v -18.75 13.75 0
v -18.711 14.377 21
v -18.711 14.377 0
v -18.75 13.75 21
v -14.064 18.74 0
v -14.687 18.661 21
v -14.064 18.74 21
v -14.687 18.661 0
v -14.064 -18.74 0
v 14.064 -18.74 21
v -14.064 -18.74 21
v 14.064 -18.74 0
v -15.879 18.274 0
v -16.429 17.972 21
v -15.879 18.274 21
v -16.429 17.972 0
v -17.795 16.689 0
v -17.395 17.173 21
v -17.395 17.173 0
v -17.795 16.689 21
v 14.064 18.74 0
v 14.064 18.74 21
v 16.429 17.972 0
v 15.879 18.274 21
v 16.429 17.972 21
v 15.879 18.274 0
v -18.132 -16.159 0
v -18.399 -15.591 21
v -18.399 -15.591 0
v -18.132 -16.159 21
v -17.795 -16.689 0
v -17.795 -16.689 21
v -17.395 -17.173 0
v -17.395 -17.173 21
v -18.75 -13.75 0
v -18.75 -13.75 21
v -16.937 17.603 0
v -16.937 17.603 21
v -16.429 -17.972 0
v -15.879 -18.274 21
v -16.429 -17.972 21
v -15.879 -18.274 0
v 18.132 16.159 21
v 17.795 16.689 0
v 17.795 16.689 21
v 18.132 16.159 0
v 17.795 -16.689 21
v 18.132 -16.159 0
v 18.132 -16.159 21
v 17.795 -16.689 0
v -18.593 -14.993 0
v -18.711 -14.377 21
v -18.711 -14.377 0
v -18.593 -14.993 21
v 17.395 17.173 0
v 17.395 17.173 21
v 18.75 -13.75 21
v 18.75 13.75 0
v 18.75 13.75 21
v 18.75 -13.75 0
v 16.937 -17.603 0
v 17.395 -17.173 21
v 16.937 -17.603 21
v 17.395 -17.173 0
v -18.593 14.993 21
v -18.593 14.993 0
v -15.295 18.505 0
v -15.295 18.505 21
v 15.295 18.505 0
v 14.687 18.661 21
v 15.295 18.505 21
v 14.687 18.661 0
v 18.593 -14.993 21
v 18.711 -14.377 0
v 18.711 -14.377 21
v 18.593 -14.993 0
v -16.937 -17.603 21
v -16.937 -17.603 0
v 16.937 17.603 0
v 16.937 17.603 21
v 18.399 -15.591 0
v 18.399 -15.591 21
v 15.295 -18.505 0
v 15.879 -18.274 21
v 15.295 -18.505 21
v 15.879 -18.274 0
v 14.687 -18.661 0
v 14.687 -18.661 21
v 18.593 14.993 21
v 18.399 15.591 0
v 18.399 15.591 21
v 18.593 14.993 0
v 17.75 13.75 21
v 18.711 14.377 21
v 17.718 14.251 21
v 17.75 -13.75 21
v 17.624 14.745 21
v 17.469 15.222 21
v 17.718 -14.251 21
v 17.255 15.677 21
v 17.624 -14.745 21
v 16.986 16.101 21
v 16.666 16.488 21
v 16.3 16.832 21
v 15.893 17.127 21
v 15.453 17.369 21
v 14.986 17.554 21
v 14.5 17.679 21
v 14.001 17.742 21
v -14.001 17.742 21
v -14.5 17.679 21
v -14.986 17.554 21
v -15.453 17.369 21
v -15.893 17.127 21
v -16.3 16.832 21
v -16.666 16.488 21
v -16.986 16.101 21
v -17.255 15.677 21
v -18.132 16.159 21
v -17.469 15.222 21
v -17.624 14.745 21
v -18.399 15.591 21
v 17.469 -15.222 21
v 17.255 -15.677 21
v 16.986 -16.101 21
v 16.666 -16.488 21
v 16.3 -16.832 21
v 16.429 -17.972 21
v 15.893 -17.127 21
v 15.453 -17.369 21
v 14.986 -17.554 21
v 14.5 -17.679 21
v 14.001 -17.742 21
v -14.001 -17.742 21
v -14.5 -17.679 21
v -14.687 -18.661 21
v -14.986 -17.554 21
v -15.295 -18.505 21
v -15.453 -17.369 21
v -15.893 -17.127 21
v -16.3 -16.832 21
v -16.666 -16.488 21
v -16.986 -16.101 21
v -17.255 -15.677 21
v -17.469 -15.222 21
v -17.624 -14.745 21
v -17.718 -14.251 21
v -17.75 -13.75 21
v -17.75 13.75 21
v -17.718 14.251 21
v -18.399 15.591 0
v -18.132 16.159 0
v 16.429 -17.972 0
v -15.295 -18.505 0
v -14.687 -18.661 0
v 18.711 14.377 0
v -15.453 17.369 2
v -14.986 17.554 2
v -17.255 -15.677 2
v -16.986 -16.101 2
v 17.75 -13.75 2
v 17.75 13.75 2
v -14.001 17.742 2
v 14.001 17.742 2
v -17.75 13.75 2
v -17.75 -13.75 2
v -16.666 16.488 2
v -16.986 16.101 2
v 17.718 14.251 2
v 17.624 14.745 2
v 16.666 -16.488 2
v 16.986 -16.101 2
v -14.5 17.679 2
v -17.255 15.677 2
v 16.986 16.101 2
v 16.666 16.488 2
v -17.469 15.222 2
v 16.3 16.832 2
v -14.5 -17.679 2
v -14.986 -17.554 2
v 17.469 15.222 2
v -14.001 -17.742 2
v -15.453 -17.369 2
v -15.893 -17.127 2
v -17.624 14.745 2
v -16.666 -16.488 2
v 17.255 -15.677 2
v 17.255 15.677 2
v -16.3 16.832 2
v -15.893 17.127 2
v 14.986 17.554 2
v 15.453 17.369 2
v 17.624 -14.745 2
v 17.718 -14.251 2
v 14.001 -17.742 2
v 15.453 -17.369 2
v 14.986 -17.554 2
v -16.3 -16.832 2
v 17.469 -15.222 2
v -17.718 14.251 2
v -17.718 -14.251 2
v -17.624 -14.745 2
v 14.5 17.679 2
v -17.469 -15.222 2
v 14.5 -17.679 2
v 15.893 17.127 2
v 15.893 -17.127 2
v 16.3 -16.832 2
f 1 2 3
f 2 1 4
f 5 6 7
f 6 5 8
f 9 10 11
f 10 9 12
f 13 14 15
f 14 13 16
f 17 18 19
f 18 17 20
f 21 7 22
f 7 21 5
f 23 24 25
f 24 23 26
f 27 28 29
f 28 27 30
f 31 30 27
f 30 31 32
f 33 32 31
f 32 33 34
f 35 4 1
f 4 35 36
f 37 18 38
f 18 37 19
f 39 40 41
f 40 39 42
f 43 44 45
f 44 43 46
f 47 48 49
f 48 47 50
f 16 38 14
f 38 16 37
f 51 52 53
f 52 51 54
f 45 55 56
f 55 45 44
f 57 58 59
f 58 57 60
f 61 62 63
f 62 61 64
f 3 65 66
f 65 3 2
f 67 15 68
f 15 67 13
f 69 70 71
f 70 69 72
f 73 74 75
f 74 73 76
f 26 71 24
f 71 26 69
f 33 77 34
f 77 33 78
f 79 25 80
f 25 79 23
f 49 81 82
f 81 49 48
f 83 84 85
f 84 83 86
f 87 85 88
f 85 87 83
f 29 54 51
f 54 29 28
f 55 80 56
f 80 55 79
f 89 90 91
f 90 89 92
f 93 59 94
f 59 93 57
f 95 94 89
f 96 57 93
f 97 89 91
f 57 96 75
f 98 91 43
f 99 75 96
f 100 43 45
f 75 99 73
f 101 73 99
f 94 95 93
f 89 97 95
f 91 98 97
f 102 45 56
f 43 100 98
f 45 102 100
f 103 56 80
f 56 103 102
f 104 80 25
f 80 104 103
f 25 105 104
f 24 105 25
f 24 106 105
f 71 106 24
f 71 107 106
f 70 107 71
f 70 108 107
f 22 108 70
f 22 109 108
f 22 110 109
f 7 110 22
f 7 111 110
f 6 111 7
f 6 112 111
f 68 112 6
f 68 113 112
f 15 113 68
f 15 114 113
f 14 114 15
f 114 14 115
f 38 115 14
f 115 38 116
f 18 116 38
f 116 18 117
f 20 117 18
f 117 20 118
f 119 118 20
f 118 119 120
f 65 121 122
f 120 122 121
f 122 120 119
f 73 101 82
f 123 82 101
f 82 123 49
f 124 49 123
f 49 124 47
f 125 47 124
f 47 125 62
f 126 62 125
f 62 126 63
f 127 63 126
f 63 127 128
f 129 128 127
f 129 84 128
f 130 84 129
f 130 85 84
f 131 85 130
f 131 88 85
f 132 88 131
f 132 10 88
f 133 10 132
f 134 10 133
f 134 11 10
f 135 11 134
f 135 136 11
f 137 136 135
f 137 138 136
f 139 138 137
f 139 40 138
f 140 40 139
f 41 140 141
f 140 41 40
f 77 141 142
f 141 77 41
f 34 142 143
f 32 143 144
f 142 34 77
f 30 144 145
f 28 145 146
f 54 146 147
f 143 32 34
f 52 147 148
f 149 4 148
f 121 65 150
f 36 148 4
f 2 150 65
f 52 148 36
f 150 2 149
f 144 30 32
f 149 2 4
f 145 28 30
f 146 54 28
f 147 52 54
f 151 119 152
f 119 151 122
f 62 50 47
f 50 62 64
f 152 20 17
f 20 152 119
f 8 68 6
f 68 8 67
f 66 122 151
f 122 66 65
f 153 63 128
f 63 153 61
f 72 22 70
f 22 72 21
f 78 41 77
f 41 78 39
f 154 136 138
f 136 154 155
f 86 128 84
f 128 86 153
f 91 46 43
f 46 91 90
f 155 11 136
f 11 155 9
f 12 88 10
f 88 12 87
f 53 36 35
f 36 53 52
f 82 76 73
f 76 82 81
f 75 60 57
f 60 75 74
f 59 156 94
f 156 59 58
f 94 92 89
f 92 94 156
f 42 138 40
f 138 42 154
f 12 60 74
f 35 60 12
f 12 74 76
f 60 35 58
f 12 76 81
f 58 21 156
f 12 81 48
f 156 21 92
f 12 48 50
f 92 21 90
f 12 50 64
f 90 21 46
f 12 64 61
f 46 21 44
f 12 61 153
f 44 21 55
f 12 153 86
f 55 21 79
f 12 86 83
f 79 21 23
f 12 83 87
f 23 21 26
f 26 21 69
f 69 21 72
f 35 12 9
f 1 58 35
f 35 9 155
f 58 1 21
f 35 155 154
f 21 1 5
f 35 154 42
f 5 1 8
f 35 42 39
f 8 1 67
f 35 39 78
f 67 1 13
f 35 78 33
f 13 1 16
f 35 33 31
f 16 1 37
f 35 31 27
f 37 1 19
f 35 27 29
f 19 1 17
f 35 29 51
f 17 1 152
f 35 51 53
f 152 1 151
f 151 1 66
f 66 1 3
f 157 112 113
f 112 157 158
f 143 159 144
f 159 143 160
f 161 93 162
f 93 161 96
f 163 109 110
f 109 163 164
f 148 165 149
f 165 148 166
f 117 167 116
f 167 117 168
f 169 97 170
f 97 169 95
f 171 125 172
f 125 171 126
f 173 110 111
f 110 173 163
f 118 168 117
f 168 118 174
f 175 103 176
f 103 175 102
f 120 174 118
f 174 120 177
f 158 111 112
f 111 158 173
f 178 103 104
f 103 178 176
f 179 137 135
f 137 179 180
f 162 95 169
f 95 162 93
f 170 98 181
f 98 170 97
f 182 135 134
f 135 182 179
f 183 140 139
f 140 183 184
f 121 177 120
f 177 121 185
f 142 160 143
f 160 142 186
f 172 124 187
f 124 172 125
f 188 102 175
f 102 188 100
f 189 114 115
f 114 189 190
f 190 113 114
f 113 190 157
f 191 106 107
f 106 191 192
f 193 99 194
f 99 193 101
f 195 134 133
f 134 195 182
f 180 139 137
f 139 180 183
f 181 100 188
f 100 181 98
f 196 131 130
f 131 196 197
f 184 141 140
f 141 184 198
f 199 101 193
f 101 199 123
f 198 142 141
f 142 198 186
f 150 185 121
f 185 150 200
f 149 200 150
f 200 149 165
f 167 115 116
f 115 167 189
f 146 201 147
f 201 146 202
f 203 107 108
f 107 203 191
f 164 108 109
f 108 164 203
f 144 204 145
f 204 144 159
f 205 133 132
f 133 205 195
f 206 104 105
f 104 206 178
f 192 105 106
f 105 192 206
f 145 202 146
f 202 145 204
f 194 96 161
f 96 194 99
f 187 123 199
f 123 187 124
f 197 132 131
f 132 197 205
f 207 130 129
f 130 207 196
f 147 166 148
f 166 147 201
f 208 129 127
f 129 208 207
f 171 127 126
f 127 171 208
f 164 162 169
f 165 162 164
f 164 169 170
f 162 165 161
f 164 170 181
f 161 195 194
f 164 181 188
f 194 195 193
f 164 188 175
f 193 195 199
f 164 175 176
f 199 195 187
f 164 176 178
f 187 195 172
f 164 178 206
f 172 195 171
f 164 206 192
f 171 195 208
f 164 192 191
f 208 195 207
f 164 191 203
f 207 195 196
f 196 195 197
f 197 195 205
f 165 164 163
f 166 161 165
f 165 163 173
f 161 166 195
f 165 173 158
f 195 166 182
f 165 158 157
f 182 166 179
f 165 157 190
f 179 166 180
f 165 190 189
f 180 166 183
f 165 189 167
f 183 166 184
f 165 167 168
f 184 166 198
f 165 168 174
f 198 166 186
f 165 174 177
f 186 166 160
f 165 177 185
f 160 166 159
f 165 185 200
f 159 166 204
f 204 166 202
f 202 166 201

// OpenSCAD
$fn = 50;


difference() {
	union() {
		hull() {
			translate(v = [-13.7500000000, 13.7500000000, 0]) {
				cylinder(h = 21, r = 5);
			}
			translate(v = [13.7500000000, 13.7500000000, 0]) {
				cylinder(h = 21, r = 5);
			}
			translate(v = [-13.7500000000, -13.7500000000, 0]) {
				cylinder(h = 21, r = 5);
			}
			translate(v = [13.7500000000, -13.7500000000, 0]) {
				cylinder(h = 21, r = 5);
			}
		}
	}
	union() {
		translate(v = [0, 0, 2]) {
			hull() {
				translate(v = [-13.7500000000, 13.7500000000, 0]) {
					cylinder(h = 19, r = 4);
				}
				translate(v = [13.7500000000, 13.7500000000, 0]) {
					cylinder(h = 19, r = 4);
				}
				translate(v = [-13.7500000000, -13.7500000000, 0]) {
					cylinder(h = 19, r = 4);
				}
				translate(v = [13.7500000000, -13.7500000000, 0]) {
					cylinder(h = 19, r = 4);
				}
			}
		}
	}
}
